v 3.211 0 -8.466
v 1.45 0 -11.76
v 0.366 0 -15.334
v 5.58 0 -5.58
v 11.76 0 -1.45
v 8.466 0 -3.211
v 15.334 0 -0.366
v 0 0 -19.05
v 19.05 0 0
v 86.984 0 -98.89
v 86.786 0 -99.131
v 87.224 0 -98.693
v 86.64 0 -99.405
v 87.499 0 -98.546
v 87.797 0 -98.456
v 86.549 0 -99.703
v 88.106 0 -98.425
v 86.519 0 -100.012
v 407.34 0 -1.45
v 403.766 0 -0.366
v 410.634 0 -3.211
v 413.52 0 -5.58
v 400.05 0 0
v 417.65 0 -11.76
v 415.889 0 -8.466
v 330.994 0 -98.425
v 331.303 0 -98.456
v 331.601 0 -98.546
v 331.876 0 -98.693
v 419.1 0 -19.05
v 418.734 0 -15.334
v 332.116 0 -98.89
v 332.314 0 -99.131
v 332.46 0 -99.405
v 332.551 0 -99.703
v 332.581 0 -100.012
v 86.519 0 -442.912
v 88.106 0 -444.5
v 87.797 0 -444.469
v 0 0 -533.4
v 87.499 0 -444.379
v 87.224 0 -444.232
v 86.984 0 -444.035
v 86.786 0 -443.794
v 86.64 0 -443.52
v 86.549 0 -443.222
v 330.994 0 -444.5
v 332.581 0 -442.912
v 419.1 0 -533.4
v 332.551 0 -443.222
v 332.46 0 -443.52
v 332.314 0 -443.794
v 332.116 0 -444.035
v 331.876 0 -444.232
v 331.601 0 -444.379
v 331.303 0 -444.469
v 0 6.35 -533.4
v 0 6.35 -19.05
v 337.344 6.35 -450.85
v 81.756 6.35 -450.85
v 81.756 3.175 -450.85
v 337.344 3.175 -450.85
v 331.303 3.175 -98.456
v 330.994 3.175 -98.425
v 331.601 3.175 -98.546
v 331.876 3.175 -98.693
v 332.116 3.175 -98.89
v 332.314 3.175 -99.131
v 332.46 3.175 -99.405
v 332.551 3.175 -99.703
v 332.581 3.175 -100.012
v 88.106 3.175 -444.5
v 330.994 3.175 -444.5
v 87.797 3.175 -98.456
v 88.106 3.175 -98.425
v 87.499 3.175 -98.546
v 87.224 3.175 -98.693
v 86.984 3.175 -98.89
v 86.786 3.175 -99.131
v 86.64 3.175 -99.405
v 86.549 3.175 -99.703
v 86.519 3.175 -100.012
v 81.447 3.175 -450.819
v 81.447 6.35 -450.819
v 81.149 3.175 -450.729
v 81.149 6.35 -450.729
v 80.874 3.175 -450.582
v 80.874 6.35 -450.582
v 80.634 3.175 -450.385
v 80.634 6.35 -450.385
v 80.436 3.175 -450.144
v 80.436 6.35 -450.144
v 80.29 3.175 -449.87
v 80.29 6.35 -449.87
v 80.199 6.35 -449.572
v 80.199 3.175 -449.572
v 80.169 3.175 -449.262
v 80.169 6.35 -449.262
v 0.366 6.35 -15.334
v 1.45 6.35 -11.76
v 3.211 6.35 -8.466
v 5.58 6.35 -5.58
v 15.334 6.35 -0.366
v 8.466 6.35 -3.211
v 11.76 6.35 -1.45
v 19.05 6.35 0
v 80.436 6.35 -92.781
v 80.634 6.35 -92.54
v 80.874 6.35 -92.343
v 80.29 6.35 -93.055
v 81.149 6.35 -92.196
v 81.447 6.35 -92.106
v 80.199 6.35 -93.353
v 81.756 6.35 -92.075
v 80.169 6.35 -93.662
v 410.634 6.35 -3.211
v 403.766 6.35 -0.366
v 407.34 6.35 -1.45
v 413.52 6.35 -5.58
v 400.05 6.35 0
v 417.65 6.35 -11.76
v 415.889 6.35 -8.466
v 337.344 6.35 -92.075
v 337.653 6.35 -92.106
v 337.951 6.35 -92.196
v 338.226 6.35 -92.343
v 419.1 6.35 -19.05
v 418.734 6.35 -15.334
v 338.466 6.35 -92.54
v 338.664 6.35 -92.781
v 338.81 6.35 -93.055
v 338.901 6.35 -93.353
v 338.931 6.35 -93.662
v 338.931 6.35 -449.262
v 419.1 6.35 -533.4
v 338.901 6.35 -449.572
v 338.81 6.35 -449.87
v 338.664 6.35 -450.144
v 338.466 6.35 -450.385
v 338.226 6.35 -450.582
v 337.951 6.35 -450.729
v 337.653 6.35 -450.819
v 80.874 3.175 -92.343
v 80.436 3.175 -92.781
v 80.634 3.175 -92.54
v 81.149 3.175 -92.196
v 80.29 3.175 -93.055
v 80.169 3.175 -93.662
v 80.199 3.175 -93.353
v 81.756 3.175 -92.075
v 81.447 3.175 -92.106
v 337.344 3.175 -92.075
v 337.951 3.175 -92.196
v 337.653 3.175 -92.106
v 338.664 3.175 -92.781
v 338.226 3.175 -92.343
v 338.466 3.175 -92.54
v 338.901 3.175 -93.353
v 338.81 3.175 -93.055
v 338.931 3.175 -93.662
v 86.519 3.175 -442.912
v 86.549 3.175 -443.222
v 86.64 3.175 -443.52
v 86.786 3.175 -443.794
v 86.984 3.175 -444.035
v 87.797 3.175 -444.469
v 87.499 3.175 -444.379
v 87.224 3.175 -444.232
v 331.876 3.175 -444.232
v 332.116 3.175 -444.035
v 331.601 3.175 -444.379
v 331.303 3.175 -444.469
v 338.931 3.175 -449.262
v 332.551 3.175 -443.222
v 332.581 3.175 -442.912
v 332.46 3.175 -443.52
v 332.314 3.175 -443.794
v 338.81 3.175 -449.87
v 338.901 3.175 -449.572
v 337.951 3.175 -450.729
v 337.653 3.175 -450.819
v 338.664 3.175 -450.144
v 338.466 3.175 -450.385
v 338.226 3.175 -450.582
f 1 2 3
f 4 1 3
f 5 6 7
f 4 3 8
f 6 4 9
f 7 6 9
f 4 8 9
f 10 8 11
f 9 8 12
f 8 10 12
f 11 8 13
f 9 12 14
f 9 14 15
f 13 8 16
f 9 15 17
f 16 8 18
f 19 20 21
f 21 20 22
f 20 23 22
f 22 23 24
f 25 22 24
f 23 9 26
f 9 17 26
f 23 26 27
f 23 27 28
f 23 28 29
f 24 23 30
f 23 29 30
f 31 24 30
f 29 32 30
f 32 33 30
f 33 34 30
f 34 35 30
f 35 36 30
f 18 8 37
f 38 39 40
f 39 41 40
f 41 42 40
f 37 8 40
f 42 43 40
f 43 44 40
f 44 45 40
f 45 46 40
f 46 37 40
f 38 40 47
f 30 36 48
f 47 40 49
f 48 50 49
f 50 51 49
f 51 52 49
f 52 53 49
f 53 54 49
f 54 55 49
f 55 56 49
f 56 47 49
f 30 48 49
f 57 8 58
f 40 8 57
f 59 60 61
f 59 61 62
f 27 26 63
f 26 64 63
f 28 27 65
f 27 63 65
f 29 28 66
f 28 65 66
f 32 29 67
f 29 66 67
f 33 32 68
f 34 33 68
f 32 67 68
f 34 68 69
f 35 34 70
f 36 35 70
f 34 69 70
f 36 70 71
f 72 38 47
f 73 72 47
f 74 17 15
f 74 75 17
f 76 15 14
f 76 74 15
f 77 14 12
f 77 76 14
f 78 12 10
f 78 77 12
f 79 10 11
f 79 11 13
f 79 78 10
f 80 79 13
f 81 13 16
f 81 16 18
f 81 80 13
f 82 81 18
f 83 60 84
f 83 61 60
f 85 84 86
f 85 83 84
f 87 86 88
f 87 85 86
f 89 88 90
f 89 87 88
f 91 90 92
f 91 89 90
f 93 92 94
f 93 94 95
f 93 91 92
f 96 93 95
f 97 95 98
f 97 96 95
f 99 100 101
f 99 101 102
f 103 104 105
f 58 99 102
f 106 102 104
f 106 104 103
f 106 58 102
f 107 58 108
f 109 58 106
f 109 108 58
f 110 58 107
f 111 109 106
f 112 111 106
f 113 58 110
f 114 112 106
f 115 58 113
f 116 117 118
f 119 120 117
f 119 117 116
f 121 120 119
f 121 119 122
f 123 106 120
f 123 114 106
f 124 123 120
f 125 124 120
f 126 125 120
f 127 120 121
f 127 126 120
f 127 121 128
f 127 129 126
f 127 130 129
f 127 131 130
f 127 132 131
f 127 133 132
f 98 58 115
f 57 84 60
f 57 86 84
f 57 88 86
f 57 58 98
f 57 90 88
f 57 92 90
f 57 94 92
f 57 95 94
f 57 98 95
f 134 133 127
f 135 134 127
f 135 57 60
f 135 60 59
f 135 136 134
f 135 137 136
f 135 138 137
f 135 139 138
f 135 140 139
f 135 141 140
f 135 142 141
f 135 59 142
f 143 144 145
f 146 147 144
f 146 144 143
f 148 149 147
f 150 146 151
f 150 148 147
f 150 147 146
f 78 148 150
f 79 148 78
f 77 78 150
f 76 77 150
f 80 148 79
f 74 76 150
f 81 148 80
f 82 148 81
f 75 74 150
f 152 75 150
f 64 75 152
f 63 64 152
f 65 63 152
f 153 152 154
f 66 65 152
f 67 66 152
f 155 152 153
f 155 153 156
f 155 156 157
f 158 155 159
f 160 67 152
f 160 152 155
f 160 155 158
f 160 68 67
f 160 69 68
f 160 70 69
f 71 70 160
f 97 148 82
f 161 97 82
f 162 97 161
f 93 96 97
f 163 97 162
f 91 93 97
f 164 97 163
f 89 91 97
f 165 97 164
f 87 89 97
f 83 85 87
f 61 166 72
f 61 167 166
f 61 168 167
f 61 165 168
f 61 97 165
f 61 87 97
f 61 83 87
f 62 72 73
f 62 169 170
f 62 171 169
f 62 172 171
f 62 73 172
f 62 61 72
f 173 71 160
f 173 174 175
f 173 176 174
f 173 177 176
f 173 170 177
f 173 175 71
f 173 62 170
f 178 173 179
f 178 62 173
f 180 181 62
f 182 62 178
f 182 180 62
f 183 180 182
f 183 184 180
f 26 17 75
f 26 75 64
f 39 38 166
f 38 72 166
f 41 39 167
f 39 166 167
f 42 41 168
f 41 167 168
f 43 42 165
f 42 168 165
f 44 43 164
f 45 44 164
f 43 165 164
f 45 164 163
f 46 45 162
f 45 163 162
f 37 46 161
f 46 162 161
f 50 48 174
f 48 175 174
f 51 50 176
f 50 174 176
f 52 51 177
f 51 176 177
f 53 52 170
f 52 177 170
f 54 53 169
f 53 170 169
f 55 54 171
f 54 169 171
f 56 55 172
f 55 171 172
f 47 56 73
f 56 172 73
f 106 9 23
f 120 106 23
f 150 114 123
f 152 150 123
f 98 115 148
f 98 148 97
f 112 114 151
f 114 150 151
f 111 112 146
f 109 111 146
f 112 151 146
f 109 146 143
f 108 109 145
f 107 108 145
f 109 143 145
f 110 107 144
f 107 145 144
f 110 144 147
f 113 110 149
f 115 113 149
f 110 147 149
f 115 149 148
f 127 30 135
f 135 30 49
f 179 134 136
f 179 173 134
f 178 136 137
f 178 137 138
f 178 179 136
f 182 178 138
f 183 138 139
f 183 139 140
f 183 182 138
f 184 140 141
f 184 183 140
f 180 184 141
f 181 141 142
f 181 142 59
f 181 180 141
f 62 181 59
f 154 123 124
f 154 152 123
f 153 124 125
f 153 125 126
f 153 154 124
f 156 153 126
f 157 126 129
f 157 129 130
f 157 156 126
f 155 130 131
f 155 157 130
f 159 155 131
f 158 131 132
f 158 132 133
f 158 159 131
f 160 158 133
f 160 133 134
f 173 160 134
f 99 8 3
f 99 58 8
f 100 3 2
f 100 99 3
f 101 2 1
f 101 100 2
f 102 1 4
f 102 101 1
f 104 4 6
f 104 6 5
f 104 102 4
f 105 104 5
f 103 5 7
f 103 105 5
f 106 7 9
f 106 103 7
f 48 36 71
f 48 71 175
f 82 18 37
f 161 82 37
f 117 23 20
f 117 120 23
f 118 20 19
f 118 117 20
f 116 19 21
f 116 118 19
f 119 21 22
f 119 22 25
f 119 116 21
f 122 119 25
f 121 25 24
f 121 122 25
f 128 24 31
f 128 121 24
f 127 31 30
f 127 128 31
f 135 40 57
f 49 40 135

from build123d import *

# Parameters (mm, degrees)
SKETCH1_W             = 419.1
SKETCH1_H             = 533.4
SKETCH1_W_2           = 246.0625
SKETCH1_H_2           = 346.075
OVERALL_SHAPE_DEPTH   = 6.35
SKETCH5_W             = 258.7625
SKETCH5_H             = 358.775
GLASS_INSET_CUT_DEPTH = 3.175
GLASS_INSET_FILLETS_R = 1.5875
FILLET1_R             = 19.05


with BuildPart() as part:
    # Sketch1 → Overall shape (new body)
    with BuildSketch(Plane(origin=(0, 0, 0), x_dir=(1, 0, 0), z_dir=(0, 1, 0))):
        with Locations((209.55, 266.7)):
            Rectangle(SKETCH1_W, SKETCH1_H)
        with Locations((209.55, 271.4625)):
            Rectangle(SKETCH1_W_2, SKETCH1_H_2, mode=Mode.SUBTRACT)
    extrude(amount=OVERALL_SHAPE_DEPTH)

    # Sketch5 → Glass inset cut (cut)
    with BuildSketch(Plane(origin=(0, 6.35, 0), x_dir=(1, 0, 0), z_dir=(0, 1, 0))):
        with Locations((209.55, 271.4625)):
            Rectangle(SKETCH5_W, SKETCH5_H)
    extrude(amount=-GLASS_INSET_CUT_DEPTH, mode=Mode.SUBTRACT)

    # Glass inset fillets
    glass_inset_fillets_edges = [part.edges().sort_by_distance(p)[0] for p in [
        (332.58125, 1.5875, -444.5),
        (86.51875, 1.5875, -444.5),
        (332.58125, 1.5875, -98.425),
        (86.51875, 1.5875, -98.425),
        (80.16875, 4.7625, -92.075),
        (80.16875, 4.7625, -450.85),
        (338.93125, 4.7625, -450.85),
        (338.93125, 4.7625, -92.075),
    ]]
    fillet(glass_inset_fillets_edges, radius=GLASS_INSET_FILLETS_R)

    # Fillet1
    fillet1_edges = [part.edges().sort_by_distance(p)[0] for p in [
        (419.1, 3.175, 0),
        (0, 3.175, 0),
    ]]
    fillet(fillet1_edges, radius=FILLET1_R)


solid = part.part
